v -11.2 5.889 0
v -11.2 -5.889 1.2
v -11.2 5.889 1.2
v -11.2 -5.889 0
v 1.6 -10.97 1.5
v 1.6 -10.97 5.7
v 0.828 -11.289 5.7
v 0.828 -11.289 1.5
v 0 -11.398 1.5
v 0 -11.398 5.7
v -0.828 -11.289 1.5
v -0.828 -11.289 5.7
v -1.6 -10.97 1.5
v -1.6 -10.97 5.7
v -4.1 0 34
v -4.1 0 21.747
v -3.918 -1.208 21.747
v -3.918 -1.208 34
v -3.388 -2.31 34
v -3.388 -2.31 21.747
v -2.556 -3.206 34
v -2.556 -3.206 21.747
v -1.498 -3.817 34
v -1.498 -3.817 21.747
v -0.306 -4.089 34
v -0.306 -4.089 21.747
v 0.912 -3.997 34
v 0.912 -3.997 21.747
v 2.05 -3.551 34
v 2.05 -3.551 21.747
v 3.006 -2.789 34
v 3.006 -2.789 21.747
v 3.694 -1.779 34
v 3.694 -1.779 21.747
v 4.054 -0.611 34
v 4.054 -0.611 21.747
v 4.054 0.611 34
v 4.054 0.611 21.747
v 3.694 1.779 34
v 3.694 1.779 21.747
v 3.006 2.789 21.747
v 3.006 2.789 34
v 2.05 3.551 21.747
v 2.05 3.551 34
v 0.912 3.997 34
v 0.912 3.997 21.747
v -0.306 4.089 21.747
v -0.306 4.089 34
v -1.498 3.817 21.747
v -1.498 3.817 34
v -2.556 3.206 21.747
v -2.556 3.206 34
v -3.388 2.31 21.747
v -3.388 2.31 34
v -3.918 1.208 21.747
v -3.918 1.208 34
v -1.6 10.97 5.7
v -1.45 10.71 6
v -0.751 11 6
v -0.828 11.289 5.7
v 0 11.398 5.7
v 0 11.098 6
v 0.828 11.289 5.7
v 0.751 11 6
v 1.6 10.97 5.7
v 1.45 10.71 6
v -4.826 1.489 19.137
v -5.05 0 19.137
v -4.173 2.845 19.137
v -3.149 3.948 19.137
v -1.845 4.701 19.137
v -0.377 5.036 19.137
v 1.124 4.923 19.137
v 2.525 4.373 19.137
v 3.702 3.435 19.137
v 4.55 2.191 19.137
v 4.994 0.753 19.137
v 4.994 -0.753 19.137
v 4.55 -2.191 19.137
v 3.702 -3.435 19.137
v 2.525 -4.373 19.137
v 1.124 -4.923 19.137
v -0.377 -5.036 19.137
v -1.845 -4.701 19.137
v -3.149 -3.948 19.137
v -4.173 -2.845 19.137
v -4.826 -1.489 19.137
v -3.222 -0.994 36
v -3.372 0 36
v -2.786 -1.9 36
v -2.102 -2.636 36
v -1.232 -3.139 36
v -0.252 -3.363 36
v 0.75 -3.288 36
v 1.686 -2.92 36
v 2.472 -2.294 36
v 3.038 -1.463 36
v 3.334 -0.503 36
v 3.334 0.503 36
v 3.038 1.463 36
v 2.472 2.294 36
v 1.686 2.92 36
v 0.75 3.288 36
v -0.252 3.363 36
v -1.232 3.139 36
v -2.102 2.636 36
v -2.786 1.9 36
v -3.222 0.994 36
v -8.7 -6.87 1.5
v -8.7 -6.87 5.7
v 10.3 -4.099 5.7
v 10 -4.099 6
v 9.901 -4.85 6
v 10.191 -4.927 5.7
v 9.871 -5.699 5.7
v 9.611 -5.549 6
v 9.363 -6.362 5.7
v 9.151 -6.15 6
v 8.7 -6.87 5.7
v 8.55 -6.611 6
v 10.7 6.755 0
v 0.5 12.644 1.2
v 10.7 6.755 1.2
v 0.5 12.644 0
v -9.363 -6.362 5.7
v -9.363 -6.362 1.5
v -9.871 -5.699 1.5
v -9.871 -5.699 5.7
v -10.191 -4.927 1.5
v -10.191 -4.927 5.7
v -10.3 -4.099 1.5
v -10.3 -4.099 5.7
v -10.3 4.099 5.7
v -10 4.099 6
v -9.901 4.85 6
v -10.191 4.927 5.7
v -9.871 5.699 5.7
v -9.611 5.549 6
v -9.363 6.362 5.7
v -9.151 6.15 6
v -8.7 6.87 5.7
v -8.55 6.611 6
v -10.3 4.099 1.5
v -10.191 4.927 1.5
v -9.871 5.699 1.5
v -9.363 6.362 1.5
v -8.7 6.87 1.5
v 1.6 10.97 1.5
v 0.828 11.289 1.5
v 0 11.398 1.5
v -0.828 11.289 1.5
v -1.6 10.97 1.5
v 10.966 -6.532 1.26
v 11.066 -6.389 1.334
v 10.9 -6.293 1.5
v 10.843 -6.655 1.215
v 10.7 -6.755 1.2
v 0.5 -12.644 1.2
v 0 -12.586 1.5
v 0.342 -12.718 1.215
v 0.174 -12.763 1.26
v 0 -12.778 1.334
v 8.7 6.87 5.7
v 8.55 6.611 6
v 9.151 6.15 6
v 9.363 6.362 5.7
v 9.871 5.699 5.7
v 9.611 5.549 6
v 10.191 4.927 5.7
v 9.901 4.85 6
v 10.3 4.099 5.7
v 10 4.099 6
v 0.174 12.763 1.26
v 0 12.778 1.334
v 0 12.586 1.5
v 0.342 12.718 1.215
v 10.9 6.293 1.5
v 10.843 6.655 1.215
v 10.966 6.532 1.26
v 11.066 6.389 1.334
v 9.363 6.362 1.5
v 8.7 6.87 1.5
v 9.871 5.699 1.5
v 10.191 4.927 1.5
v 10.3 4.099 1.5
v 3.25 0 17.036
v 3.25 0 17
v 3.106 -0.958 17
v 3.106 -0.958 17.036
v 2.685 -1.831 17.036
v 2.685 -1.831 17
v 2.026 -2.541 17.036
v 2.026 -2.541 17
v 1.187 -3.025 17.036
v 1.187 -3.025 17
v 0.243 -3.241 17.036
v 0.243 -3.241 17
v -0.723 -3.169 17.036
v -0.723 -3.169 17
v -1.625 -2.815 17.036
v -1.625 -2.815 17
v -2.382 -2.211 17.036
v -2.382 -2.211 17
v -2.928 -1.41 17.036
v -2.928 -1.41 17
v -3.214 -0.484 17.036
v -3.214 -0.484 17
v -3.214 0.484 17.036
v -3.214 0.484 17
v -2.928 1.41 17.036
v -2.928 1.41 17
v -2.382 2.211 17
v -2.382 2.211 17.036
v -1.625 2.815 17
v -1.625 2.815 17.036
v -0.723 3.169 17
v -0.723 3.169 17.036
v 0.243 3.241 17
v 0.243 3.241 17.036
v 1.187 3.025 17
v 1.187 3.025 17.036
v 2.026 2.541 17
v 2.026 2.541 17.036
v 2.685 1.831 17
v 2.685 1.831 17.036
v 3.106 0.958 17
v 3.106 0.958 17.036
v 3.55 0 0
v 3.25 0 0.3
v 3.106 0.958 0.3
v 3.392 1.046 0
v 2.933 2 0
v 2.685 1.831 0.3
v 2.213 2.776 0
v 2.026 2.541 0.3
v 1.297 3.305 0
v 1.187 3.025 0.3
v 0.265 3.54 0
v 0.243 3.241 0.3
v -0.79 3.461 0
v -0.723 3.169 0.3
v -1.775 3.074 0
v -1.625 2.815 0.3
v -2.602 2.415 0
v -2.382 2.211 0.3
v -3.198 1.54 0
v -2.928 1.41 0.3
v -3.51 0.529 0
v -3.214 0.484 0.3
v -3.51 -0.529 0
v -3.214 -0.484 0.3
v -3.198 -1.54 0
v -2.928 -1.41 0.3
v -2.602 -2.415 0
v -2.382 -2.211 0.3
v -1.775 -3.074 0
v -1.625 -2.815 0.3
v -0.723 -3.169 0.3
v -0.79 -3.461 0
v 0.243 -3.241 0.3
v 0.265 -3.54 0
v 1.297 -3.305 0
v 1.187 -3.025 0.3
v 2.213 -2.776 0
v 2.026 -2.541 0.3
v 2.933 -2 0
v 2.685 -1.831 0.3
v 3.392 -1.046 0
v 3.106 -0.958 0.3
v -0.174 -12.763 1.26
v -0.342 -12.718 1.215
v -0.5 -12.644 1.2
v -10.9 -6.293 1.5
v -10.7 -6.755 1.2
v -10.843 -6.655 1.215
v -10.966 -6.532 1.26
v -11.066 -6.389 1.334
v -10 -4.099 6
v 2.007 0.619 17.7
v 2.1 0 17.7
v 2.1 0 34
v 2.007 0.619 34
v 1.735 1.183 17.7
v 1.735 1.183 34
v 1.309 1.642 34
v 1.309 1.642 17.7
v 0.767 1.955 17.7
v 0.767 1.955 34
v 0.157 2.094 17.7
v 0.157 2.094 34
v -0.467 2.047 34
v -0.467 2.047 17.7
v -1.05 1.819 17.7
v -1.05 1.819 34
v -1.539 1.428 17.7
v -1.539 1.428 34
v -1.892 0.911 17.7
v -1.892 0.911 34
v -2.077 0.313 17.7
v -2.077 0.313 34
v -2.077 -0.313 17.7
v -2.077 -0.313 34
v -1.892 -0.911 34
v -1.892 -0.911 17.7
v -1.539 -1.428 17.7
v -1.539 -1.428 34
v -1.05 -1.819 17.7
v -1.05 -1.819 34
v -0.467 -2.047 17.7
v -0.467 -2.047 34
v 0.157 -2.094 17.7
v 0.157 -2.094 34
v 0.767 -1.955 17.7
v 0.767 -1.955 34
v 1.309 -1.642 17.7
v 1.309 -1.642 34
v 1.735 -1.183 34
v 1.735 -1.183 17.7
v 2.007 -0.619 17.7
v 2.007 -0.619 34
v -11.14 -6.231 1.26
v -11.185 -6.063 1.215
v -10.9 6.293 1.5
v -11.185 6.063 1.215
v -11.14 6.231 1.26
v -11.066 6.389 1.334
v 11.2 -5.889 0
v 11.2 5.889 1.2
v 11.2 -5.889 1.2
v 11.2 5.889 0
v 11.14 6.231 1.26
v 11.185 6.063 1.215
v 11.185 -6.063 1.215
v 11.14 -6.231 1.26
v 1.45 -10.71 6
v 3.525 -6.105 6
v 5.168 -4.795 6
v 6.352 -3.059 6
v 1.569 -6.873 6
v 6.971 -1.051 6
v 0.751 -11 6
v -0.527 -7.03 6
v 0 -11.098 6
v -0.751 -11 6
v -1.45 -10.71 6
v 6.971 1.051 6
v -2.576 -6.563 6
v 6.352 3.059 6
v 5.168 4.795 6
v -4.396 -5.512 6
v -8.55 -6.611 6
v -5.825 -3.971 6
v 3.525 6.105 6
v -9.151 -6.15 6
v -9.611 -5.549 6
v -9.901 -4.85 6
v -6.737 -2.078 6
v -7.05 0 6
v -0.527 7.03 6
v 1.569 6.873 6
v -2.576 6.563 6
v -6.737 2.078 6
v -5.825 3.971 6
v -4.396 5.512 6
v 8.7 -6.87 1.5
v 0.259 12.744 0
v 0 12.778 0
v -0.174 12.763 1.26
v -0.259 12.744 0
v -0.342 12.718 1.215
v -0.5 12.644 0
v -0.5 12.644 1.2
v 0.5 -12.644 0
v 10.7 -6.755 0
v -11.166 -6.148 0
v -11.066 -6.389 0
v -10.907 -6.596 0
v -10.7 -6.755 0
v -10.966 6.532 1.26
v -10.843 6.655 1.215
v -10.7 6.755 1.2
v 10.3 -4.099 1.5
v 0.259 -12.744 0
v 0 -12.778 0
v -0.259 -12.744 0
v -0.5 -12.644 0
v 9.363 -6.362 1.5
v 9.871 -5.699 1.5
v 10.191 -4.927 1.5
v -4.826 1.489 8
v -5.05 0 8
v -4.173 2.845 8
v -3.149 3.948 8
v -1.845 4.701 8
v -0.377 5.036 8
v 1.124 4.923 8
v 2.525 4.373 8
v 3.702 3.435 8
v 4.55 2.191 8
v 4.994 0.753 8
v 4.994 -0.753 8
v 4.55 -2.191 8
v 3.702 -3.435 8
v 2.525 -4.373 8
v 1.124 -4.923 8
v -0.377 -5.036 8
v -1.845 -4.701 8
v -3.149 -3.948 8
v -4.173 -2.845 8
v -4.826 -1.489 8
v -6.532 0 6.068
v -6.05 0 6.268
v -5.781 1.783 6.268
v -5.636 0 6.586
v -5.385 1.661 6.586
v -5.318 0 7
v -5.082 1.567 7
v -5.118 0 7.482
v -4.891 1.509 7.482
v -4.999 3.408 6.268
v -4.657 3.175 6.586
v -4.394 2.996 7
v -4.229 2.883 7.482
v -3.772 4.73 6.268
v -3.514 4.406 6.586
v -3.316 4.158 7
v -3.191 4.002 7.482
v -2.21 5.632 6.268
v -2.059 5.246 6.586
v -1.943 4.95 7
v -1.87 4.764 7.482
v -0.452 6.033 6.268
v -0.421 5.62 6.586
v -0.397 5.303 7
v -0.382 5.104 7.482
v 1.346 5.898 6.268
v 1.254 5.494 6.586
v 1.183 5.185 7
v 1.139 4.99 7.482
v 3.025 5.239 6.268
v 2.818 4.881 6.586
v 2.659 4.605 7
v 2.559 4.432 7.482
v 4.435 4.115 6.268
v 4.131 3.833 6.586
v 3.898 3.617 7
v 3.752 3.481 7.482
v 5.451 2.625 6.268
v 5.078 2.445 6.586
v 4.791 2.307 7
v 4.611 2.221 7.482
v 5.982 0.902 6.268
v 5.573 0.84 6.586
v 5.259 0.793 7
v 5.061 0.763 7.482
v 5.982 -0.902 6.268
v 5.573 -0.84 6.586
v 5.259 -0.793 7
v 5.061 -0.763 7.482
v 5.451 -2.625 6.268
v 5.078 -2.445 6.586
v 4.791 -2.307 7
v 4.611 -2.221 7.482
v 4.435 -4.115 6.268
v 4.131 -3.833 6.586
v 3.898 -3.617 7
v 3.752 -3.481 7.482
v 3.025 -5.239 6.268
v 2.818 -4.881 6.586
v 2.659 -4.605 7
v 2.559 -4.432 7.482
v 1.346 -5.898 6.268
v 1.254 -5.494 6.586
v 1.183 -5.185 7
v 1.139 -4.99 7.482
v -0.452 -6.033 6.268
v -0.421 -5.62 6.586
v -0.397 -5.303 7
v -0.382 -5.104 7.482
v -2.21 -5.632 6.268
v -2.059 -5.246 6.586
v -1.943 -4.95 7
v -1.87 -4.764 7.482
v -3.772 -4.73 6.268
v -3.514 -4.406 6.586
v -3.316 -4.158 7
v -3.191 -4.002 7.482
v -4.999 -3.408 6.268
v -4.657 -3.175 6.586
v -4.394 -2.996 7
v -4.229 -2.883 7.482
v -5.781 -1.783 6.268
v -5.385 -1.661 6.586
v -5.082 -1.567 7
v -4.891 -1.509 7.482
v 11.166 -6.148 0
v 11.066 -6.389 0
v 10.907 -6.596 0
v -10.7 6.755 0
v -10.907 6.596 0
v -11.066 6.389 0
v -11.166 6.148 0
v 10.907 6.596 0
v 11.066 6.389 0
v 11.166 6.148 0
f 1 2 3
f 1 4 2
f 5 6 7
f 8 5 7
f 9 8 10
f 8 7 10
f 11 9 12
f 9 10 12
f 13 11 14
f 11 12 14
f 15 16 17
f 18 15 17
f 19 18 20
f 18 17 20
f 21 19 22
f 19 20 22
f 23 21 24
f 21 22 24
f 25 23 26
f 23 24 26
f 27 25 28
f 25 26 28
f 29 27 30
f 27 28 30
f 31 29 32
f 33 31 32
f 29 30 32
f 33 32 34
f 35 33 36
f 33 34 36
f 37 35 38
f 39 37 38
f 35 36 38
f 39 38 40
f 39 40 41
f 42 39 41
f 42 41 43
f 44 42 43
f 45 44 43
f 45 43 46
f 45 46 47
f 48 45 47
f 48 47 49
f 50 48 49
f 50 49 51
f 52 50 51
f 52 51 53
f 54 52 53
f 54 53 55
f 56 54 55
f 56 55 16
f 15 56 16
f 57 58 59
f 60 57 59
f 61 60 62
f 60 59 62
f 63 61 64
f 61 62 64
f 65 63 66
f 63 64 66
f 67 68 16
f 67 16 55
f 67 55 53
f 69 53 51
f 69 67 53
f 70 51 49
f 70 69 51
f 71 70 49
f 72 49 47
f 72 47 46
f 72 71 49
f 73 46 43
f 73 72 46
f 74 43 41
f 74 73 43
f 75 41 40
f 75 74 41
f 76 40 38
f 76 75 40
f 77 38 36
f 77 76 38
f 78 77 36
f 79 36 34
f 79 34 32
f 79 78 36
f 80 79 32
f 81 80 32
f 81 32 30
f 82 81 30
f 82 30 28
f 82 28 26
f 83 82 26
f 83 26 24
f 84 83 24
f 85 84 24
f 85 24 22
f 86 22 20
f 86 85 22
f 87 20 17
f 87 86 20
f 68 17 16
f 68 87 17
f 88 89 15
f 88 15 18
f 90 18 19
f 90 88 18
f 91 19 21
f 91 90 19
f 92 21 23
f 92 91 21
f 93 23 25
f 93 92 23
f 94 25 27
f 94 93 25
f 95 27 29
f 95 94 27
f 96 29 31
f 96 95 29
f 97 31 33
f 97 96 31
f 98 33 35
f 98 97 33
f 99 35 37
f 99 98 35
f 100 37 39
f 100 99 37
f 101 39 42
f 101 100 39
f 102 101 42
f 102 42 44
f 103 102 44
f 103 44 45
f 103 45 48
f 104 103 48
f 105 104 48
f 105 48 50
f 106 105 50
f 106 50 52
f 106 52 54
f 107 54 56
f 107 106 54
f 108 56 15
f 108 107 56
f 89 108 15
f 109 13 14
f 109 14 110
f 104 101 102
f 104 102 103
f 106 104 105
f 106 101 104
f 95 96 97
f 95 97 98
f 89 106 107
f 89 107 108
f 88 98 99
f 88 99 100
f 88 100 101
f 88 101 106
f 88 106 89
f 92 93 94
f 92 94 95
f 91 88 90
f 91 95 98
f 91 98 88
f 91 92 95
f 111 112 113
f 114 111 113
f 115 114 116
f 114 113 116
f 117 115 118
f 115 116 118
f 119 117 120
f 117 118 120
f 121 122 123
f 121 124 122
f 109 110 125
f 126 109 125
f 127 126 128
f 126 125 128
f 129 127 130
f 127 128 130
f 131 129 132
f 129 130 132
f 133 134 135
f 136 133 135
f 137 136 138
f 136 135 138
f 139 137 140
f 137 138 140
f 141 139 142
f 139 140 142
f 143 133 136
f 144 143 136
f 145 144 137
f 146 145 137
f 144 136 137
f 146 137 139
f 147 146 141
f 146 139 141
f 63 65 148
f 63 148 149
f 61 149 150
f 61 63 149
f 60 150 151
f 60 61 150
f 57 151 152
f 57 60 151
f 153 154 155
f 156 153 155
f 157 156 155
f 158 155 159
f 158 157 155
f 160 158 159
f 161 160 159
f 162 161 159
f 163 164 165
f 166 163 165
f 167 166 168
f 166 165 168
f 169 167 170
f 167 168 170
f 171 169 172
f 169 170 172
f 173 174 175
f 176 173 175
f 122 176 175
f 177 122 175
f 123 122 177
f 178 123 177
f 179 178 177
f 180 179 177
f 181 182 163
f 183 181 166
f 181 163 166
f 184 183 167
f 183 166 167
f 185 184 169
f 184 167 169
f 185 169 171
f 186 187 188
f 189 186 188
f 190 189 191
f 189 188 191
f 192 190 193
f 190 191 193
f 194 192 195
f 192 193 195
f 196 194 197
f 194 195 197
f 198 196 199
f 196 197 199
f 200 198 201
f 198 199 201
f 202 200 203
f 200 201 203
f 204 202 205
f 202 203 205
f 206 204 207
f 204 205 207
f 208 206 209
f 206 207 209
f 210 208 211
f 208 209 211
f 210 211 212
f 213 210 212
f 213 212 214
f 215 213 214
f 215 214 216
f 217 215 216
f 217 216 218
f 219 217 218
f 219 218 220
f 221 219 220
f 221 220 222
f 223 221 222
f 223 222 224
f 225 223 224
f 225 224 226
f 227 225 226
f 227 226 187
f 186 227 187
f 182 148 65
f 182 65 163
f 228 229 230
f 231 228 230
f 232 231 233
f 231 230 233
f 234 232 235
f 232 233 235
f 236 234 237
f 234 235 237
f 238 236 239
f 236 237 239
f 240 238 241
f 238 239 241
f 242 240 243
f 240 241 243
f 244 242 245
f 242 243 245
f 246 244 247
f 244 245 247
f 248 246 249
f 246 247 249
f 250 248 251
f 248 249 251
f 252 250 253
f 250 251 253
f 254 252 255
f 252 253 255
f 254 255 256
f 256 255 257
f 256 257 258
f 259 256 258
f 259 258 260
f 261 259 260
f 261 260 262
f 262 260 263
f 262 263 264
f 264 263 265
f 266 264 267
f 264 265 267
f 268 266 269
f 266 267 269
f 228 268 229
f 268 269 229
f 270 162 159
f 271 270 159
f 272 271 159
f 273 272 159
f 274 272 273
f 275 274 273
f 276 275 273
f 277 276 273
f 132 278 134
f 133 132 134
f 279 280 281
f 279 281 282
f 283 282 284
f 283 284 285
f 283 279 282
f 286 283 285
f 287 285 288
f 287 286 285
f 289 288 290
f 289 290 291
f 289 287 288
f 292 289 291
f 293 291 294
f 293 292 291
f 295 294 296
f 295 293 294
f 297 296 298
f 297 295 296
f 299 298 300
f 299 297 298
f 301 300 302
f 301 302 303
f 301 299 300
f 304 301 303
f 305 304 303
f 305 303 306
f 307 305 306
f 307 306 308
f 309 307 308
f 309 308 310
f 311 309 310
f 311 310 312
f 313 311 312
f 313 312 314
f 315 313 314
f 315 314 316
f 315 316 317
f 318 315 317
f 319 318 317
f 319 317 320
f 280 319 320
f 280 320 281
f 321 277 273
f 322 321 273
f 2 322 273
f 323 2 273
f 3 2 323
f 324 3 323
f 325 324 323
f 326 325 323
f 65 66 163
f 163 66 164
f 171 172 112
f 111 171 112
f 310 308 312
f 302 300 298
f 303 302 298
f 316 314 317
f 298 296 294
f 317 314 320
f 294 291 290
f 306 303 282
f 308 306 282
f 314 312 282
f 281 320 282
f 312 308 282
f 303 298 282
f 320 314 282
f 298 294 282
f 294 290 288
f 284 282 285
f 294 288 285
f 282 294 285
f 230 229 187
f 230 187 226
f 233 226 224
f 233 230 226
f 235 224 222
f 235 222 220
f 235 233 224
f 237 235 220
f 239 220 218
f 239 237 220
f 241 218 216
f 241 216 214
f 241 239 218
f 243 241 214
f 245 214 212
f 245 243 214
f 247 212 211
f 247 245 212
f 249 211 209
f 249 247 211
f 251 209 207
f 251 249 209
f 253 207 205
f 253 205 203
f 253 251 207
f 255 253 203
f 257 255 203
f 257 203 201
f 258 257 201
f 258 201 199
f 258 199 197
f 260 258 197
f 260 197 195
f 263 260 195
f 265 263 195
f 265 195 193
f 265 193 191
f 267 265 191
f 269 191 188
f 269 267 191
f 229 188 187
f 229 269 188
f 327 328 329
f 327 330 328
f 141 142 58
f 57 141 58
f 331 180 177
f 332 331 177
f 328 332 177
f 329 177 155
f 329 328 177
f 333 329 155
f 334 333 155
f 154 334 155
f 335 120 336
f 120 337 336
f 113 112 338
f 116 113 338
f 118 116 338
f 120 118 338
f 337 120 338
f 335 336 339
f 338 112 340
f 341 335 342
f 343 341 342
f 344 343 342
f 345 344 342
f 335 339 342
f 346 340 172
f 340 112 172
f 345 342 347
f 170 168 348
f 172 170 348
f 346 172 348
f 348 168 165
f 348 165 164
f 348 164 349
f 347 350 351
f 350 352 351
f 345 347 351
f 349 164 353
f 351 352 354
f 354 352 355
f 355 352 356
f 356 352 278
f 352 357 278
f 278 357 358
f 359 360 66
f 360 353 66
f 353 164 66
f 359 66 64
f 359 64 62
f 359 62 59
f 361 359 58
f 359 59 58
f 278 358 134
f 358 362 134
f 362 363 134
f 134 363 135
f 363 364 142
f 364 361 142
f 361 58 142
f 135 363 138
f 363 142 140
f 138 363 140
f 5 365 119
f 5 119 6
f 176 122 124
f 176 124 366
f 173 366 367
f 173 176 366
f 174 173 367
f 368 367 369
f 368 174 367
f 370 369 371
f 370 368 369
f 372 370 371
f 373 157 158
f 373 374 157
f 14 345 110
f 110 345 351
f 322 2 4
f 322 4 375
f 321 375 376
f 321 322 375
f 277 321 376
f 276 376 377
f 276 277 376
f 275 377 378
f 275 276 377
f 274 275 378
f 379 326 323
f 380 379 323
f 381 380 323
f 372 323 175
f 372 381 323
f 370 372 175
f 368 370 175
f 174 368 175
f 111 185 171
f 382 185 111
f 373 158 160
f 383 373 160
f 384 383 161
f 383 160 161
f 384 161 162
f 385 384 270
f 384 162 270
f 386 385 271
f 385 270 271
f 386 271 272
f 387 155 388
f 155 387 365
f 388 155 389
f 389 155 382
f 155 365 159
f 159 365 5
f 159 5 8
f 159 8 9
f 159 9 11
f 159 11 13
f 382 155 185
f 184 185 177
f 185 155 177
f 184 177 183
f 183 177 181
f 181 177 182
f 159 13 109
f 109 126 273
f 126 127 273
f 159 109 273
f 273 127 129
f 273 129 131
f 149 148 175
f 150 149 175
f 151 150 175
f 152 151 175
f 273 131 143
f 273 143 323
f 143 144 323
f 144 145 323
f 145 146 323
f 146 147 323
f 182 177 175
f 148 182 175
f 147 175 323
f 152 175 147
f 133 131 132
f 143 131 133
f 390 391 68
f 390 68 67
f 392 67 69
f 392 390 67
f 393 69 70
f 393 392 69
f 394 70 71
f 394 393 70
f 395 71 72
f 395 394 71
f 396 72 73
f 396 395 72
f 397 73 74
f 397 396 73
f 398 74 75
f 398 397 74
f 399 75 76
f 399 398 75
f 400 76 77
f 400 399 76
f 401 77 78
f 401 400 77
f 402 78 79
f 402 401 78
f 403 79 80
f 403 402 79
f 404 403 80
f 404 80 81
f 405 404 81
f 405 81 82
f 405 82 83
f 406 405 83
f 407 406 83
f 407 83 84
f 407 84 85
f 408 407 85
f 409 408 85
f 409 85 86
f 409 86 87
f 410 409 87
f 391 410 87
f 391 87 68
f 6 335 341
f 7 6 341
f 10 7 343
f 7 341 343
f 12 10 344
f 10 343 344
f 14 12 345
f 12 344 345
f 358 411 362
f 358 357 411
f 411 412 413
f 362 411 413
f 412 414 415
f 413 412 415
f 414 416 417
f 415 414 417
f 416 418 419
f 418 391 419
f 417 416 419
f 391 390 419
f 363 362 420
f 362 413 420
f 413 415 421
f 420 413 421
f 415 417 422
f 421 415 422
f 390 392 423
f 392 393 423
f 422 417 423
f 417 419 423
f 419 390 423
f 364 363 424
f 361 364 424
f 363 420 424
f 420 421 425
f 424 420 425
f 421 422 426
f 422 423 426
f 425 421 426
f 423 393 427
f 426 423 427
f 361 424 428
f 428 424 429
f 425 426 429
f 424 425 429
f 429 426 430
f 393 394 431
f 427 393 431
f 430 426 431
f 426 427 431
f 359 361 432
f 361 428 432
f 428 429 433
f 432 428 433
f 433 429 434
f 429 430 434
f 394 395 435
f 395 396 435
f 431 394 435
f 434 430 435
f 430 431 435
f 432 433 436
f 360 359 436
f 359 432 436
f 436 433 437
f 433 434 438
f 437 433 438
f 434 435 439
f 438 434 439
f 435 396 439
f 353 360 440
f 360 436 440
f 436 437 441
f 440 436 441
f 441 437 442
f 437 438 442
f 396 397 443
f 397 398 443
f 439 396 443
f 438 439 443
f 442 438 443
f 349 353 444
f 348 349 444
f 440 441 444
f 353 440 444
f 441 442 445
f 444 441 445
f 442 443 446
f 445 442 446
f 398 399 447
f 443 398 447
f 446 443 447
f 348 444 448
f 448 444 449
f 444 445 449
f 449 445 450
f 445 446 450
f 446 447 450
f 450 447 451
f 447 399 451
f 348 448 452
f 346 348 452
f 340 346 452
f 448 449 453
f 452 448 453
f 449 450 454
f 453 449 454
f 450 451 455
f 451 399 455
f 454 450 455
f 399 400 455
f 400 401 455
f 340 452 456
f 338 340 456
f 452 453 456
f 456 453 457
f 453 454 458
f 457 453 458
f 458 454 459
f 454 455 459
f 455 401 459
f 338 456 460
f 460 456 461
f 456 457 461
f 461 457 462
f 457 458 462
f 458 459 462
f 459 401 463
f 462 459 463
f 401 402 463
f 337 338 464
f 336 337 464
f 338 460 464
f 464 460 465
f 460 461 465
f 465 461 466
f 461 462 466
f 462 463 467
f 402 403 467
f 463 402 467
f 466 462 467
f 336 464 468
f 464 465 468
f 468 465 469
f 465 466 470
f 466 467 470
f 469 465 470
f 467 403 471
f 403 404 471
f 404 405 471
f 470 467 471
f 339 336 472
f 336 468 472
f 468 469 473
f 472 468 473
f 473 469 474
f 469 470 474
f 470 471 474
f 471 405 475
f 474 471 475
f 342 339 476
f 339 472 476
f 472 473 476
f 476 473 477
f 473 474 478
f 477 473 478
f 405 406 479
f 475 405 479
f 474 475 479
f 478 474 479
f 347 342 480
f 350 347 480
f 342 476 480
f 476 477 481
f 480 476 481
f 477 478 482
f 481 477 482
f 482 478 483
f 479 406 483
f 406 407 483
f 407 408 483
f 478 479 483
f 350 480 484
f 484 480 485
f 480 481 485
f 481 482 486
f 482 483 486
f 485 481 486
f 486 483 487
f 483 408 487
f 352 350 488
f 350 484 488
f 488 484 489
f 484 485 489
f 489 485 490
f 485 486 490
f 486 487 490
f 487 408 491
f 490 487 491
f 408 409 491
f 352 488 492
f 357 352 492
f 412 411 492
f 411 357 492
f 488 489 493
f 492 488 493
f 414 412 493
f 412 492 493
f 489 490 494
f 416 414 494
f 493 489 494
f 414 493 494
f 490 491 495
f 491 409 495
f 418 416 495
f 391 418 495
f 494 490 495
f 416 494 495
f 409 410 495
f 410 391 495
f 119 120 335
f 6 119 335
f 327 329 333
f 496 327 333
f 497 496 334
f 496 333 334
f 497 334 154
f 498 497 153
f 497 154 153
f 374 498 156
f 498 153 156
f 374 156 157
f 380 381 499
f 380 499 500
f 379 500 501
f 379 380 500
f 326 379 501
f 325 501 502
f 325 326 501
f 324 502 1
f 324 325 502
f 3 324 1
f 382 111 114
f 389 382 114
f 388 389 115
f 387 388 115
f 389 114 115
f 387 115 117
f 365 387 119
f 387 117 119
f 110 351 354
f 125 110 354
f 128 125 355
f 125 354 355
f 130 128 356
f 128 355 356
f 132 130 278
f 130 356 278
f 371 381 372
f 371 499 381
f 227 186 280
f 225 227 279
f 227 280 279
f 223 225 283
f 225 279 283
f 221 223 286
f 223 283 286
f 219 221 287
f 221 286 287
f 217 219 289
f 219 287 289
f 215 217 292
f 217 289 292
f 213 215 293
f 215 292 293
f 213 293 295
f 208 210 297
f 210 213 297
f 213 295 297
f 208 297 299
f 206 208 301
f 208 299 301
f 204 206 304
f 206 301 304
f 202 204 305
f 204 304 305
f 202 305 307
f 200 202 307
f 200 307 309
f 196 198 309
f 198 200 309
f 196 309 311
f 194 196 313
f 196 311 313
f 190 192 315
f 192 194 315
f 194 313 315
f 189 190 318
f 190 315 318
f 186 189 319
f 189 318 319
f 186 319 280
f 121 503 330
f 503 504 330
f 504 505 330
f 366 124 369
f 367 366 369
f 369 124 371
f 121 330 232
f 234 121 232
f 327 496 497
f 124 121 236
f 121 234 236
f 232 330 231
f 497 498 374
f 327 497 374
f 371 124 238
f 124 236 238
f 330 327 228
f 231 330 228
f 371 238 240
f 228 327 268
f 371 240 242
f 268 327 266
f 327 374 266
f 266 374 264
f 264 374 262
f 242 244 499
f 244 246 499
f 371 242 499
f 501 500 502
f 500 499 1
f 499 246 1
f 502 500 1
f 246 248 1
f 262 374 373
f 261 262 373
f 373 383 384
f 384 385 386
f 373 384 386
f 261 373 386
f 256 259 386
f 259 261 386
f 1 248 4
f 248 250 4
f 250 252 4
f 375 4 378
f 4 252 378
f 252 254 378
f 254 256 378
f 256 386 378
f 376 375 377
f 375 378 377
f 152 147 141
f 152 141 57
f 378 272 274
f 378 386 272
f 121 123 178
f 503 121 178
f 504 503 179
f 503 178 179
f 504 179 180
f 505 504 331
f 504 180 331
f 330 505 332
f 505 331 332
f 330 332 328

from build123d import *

# Parameters (mm, degrees)
BOSS_EXTRUDE1_DEPTH  = 1.5
SKETCH1_8_R          = 4.1
BOSS_EXTRUDE3_DEPTH  = 36
SKETCH1_9_R          = 5.05
BOSS_EXTRUDE4_DEPTH  = 19
SHELL1_START         = 2
SHELL1_OUTLINE_R     = 2.1
SHELL1_DEPTH         = 32
SHELL1_2_OUTLINE_R   = 3.05
SHELL1_2_OUTLINE_R_2 = 2.1
SHELL1_2_DEPTH       = 15
SKETCH1_10_R         = 3.25
CUT_EXTRUDE1_DEPTH   = 17
SKETCH1_3_R          = 3.25
BOSS_EXTRUDE2_DEPTH  = 6
CHAMFER1_SIZE        = 2
CHAMFER1_SIZE2       = 0.727940469
CHAMFER2_SIZE        = 2.747477419
CHAMFER2_SIZE_2      = 1
CHAMFER3_SIZE        = 1.212435565
CHAMFER3_SIZE_2      = 0.7
CHAMFER6_SIZE        = 0.3
FILLET1_R            = 3.2
CHAMFER5_SIZE        = 0.3
FILLET2_R            = 1
FILLET3_R            = 2


# Read off the part's stored shape, not the designer's step: Shell1
with BuildPart() as part:
    # Sketch1 → Boss-Extrude1 (new body)
    with BuildSketch(Plane.XY):
        Polygon((-11.2, 6.466323015), (0, 12.93264603), (11.2, 6.466323015), (11.2, -6.466323015), (0, -12.93264603), (-11.2, -6.466323015), align=None)
    extrude(amount=BOSS_EXTRUDE1_DEPTH)

    # Sketch1<8> → Boss-Extrude3 (add)
    with BuildSketch(Plane.XY):
        with Locations(Location((0, 0, 0), (0, 0, 180))):
            Circle(SKETCH1_8_R)
    extrude(amount=BOSS_EXTRUDE3_DEPTH)

    # Sketch1<9> → Boss-Extrude4 (add)
    with BuildSketch(Plane.XY):
        with Locations(Location((0, 0, 0), (0, 0, 180))):
            Circle(SKETCH1_9_R)
    extrude(amount=BOSS_EXTRUDE4_DEPTH)

    # Shell1 outline → Shell1 (cut)
    with BuildSketch(Plane.XY.offset(SHELL1_START)):
        Circle(SHELL1_OUTLINE_R)
    extrude(amount=SHELL1_DEPTH, mode=Mode.SUBTRACT)

    # Shell1 2 outline → Shell1 2 (cut)
    with BuildSketch(Plane.XY.offset(SHELL1_START)):
        Circle(SHELL1_2_OUTLINE_R)
        Circle(SHELL1_2_OUTLINE_R_2, mode=Mode.SUBTRACT)
    extrude(amount=SHELL1_2_DEPTH, mode=Mode.SUBTRACT)

    # Sketch1<10> → Cut-Extrude1 (cut)
    with BuildSketch(Plane.XY):
        Circle(SKETCH1_10_R)
    extrude(amount=CUT_EXTRUDE1_DEPTH, mode=Mode.SUBTRACT)

    # Sketch1<3> → Boss-Extrude2 (add)
    with BuildSketch(Plane.XY):
        Polygon((0, 11.893415545), (10.3, 5.946707773), (10.3, -5.946707773), (0, -11.893415545), (-10.3, -5.946707773), (-10.3, 5.946707773), align=None)
        Circle(SKETCH1_3_R, mode=Mode.SUBTRACT)
    extrude(amount=BOSS_EXTRUDE2_DEPTH)

    # Chamfer1
    chamfer1_edges = [part.edges().sort_by_distance(p)[0] for p in [
        (4.1, 0, 36),
    ]]
    chamfer1_side = [part.faces().sort_by_distance(p)[0] for p in [
        (4.1, 0, 27.5),
    ]]
    chamfer(chamfer1_edges, length=CHAMFER1_SIZE, length2=CHAMFER1_SIZE2, reference=chamfer1_side[0])

    # Chamfer2
    # the kernel refuses this chamfer: 2.747477419, 1 mm, written as the material it adds along each edge
    with BuildSketch(Plane(origin=(0, 0, 19), x_dir=(-1, 0, 0), z_dir=(0, -1, 0))) as chamfer2_piece_1_section:
        Polygon((4.1, -CHAMFER2_SIZE), (4.1 + CHAMFER2_SIZE_2, 0), (4.1, 0), align=None)
    chamfer2_piece_1 = revolve(axis=Axis((0, 0, 19), (0, 0, -1)), mode=Mode.PRIVATE)
    chamfer2_piece_1 = chamfer2_piece_1 & Plane(origin=(0, 0, 20.481947897), x_dir=(-1, 0, 0), z_dir=(0, 0, -1)) * Cylinder(5.05, 21, mode=Mode.PRIVATE)
    add(chamfer2_piece_1)

    # Chamfer3
    # the kernel refuses this chamfer: 1.212435565, 0.7 mm, written as the material it takes off along each edge
    with BuildSketch(Plane(origin=(0, 0, 17), x_dir=(1, 0, 0), z_dir=(0, -1, 0))) as chamfer3_piece_1_section:
        Polygon((2.1 + CHAMFER3_SIZE, 0), (2.1, CHAMFER3_SIZE_2), (2.1, 0), align=None)
    chamfer3_piece_1 = revolve(axis=Axis((0, 0, 17), (0, 0, 1)), mode=Mode.PRIVATE)
    chamfer3_piece_1 = chamfer3_piece_1 & Plane(origin=(0, 0, 17.363214185), x_dir=(1, 0, 0), z_dir=(0, 0, -1)) * Cylinder(3.25, 14, mode=Mode.PRIVATE)
    add(chamfer3_piece_1, mode=Mode.SUBTRACT)

    # Chamfer6
    chamfer6_edges = [part.edges().sort_by_distance(p)[0] for p in [
        (-3.25, 0, 0),
    ]]
    chamfer(chamfer6_edges, length=CHAMFER6_SIZE)

    # Fillet1
    fillet1_edges = [part.edges().sort_by_distance(p)[0] for p in [
        (-10.3, -5.946707773, 3.75),
        (0, -11.893415545, 3.75),
        (10.3, -5.946707773, 3.75),
        (10.3, 5.946707773, 3.75),
        (0, 11.893415545, 3.75),
        (-10.3, 5.946707773, 3.75),
    ]]
    fillet(fillet1_edges, radius=FILLET1_R)

    # Chamfer5
    chamfer5_edges = [part.edges().sort_by_distance(p)[0] for p in [
        (-5.15, -8.920061659, 6),
        (5.15, 8.920061659, 6),
        (-5.15, 8.920061659, 6),
        (-10.3, 0, 6),
        (9.871281292, 5.699186911, 6),
        (0, 11.398373822, 6),
        (-9.871281292, 5.699186911, 6),
        (-9.871281292, -5.699186911, 6),
        (0, -11.398373822, 6),
        (9.871281292, -5.699186911, 6),
        (5.6, 9.699484522, 1.5),
        (11.2, 0, 1.5),
        (5.6, -9.699484522, 1.5),
        (-5.6, -9.699484522, 1.5),
        (-11.2, 0, 1.5),
        (-5.6, 9.699484522, 1.5),
        (10.3, 0, 6),
        (5.15, -8.920061659, 6),
    ]]
    chamfer(chamfer5_edges, length=CHAMFER5_SIZE)

    # Fillet2
    fillet2_edges = [part.edges().sort_by_distance(p)[0] for p in [
        (11.2, 6.466323015, 0.6),
        (11.2, -6.466323015, 0.6),
        (0, -12.93264603, 0.6),
        (-11.2, -6.466323015, 0.6),
        (-11.2, 6.466323015, 0.6),
        (0, 12.93264603, 0.6),
    ]]
    fillet(fillet2_edges, radius=FILLET2_R)

    # Fillet3
    fillet3_edges = [part.edges().sort_by_distance(p)[0] for p in [
        (5.05, 0, 6),
    ]]
    fillet(fillet3_edges, radius=FILLET3_R)


solid = part.part
